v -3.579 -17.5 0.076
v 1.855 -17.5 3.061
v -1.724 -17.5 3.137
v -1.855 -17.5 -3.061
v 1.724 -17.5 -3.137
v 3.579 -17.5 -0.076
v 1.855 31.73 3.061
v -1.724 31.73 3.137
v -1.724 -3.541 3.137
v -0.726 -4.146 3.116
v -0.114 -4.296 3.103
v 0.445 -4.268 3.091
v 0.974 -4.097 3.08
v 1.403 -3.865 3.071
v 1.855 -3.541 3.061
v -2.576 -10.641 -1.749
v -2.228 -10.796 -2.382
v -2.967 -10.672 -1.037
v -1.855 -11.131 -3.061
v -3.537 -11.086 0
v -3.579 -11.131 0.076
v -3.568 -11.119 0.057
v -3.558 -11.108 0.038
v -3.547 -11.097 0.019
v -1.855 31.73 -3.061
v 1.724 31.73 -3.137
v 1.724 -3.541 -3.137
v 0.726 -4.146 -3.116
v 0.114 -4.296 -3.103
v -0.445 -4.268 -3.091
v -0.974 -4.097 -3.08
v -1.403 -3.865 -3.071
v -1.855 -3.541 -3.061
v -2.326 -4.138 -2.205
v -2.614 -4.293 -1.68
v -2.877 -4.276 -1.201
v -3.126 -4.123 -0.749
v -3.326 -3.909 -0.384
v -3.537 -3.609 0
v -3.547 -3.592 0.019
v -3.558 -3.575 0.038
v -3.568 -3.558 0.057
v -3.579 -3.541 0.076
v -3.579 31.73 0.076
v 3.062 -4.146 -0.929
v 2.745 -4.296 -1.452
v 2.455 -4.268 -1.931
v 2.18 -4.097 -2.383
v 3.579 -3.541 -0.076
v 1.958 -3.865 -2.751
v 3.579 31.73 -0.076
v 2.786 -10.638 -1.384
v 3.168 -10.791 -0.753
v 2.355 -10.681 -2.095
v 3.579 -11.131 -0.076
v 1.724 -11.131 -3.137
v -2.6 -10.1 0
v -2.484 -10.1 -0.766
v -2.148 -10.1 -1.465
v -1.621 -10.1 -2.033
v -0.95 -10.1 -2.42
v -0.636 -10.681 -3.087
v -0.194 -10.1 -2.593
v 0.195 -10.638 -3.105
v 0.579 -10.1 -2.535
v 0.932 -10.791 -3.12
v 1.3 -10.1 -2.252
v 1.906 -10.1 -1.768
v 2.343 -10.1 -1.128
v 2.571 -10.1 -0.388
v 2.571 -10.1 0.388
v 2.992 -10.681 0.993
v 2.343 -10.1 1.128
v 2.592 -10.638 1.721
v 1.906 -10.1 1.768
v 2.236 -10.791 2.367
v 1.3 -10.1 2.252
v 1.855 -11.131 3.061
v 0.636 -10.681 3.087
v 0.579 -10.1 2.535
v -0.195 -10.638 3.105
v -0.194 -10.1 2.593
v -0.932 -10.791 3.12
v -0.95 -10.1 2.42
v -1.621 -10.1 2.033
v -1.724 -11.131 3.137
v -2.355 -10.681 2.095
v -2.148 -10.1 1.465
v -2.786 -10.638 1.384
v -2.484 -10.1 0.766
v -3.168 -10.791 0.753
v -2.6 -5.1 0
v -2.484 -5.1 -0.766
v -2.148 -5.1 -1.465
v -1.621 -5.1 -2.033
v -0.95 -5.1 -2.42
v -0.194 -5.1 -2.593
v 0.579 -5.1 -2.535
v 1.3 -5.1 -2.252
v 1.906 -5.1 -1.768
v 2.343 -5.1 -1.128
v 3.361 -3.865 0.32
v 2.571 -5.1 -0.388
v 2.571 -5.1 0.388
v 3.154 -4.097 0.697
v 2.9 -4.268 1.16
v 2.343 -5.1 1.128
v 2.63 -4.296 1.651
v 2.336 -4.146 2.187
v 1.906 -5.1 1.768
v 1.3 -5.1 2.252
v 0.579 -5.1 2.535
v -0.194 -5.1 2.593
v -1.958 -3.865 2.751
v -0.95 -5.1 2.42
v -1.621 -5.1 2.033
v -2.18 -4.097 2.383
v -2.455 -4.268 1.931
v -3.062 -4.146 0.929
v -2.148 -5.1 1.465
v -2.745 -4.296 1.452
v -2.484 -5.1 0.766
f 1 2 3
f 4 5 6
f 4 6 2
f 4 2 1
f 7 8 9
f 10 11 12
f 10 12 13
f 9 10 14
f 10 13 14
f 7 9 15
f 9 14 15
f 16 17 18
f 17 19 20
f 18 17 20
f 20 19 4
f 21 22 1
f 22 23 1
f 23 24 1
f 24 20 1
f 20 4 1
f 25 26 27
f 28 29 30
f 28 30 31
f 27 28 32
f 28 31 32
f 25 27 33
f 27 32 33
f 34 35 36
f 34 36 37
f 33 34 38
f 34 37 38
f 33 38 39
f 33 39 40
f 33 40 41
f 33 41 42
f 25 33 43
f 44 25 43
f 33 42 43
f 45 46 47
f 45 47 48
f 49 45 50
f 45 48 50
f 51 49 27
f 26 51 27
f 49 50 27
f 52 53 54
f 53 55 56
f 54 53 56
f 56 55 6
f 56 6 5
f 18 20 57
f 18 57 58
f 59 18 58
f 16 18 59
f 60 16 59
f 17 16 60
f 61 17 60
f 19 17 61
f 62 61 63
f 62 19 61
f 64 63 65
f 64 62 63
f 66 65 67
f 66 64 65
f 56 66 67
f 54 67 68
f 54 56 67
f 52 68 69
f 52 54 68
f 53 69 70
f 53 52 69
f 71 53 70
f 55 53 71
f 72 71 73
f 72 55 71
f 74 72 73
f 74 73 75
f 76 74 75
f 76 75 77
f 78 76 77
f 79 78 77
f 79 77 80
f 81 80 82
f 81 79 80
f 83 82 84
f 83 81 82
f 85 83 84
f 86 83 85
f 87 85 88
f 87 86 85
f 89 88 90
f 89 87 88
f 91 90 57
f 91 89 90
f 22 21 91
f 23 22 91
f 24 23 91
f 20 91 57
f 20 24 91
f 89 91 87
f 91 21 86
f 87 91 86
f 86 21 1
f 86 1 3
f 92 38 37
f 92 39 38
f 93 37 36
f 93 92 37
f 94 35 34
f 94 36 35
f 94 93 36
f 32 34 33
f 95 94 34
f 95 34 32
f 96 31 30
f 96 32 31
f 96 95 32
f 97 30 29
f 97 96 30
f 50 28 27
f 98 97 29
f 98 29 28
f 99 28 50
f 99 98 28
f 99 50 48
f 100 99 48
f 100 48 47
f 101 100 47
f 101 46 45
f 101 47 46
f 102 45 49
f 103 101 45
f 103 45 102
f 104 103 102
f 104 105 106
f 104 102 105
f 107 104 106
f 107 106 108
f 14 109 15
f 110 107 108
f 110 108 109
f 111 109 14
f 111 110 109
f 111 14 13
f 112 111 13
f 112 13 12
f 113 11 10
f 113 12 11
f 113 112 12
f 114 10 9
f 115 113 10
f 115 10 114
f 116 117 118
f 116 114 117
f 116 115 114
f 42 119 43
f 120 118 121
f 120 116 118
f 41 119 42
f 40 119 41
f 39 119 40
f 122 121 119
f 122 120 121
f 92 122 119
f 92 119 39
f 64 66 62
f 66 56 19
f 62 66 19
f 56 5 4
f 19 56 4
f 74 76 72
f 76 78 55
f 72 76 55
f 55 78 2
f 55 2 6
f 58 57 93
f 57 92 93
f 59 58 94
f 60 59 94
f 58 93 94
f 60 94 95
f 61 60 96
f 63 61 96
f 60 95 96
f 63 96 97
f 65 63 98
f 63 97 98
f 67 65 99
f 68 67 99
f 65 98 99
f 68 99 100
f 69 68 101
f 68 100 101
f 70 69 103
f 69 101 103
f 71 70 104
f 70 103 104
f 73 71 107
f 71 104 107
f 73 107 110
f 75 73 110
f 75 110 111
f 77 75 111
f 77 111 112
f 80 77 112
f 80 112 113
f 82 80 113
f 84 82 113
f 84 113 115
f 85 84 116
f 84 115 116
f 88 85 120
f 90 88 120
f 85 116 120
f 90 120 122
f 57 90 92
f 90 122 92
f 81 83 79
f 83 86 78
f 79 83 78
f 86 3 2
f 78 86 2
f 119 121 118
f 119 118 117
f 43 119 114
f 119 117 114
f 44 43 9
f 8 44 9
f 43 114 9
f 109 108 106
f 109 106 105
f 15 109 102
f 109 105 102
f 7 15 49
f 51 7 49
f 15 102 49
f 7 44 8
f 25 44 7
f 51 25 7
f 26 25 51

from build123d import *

# Parameters (mm, degrees)
F0_W     = 2.6
F0_H     = 5
F2_R     = 3.75
F3_DEPTH = 65


with BuildPart() as f1:
    # F0 (on Top) → F1 (revolve)
    with BuildSketch(Plane.XY):
        Polygon((-2.6, -5.1), (0, -5.1), (0, 31.73), (-3.75, 31.73), (-3.75, 17.5), (-3.75, -3.27), align=None)
        with Locations((-1.3, -7.6)):
            Rectangle(F0_W, F0_H)
        Polygon((-3.75, -11.31), (-3.75, -17.5), (0, -17.5), (0, -10.1), (-2.6, -10.1), align=None)
    revolve(axis=Axis((0, 7.115, 0), (0, -1, 0)))

    # F2 (on face) → F3 (cut)
    with BuildSketch(Plane.XZ.offset(17.5)):
        Circle(F2_R)
        Polygon((-3.578769, 0.075814), (-1.723728, 3.137212), (1.855041, 3.061398), (3.578769, -0.075814), (1.723728, -3.137212), (-1.855041, -3.061398), align=None, mode=Mode.SUBTRACT)
    extrude(amount=-F3_DEPTH, mode=Mode.SUBTRACT)


solid = f1.part
